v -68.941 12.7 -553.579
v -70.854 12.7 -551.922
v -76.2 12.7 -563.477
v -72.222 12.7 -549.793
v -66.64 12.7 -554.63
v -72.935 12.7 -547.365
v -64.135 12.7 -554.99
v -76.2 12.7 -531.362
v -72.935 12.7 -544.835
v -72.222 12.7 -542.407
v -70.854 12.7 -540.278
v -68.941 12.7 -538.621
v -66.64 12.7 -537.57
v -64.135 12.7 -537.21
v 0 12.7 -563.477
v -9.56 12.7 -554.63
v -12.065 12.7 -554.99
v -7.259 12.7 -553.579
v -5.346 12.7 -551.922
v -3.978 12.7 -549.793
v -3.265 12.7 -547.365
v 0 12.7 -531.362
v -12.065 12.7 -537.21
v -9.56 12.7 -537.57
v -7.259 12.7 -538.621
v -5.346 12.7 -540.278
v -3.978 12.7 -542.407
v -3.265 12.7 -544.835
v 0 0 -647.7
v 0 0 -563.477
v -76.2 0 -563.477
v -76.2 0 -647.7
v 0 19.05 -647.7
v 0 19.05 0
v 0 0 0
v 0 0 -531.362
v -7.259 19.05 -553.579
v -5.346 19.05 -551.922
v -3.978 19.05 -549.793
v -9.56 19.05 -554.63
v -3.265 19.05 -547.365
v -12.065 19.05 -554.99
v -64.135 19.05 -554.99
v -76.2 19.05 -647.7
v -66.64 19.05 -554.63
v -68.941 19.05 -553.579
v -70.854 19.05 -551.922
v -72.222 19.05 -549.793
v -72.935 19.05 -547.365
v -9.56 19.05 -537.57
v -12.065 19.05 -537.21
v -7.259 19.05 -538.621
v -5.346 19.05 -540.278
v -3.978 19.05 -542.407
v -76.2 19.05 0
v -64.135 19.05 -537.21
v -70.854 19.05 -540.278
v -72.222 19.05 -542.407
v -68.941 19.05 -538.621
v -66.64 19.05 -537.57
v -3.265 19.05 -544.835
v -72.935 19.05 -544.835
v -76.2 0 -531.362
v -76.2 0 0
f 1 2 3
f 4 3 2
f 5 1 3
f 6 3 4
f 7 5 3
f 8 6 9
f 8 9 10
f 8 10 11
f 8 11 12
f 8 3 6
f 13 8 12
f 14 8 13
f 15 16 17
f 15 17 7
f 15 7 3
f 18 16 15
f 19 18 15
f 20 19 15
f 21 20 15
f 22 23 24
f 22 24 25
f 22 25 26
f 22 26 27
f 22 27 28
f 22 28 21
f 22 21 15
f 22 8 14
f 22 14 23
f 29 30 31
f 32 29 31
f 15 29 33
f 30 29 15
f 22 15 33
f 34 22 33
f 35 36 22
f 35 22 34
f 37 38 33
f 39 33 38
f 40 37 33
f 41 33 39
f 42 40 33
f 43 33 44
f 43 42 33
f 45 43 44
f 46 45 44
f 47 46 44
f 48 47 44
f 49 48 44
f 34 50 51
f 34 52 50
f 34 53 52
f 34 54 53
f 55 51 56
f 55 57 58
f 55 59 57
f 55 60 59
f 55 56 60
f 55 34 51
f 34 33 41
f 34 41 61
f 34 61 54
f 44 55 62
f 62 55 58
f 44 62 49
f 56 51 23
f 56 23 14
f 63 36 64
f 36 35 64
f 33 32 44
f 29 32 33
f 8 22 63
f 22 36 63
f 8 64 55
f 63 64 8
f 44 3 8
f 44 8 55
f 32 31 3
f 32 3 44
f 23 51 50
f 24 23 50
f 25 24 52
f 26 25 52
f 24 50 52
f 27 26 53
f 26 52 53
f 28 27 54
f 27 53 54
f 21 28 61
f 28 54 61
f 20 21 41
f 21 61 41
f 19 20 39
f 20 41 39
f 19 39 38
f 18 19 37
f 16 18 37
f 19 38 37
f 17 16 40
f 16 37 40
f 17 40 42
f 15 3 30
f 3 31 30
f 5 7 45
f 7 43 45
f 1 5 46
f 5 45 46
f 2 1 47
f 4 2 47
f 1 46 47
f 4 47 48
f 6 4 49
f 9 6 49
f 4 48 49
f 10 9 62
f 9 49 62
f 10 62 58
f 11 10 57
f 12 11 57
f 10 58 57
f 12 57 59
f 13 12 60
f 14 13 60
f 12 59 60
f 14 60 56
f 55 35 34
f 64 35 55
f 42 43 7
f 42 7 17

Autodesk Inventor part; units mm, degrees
ref_plane "YZ Plane" through (0, 0, 0) normal (1, 0, 0) x (0, 1, 0)
ref_plane "XZ Plane" through (0, 0, 0) normal (0, 1, 0) x (-1, 0, 0)
ref_plane "XY Plane" through (0, 0, 0) normal (0, 0, 1) x (1, 0, 0)
sketch "Sketch1" plane through (0, 0, 0) normal (0, 1, 0) x (-1, 0, 0)
  line L0 (0, 0) -> (76.2, 0)
  line L1 (76.2, 0) -> (76.2, -647.7)
  line L2 (76.2, -647.7) -> (0, -647.7)
  line L3 (0, -647.7) -> (0, 0)
  dimension "d1" = 76.2
  dimension "d2" = 647.7
extrude "Extrusion1" add sketch "Sketch1" along normal blind 19.05
sketch "Sketch2" plane through (0, 19.05, 0) normal (0, 1, 0) x (1, 0, 0)
  line L0 (-64.135, 554.99) -> (-12.065, 554.99)
  line L1 (-12.065, 554.99) -> (-12.065, 537.21)
  line L2 (-12.065, 537.21) -> (-64.135, 537.21)
  line L3 (-64.135, 537.21) -> (-64.135, 554.99)
  circle A0 centre (-64.135, 546.1) radius 8.89
  circle A1 centre (-12.065, 546.1) radius 8.89
  line L4 (-73.025, 606.1343) -> (-73.025, 587.8403) construction
  line L5 (-3.175, 554.99) -> (-3.175, 587.8403) construction
  line L6 (0, 647.7) -> (-76.2, 647.7) projected
  line L7 (-38.1, 647.7) -> (-38.1, 0) construction
  line L8 (-76.2, 0) -> (0, 0) projected
  dimension "d5" = 69.85
  dimension "d6" = 34.925
  dimension "d7" = 17.78
  dimension "d8" = 101.6
extrude "Extrusion2" cut sketch "Sketch2" against normal blind 25.4
sketch "Sketch3" plane through (0, 0, 0) normal (0, -1, 0) x (1, 0, 0)
  line L0 (0, 0) -> (0, -647.7) projected
  line L1 (-76.2, -647.7) -> (-76.2, 0) projected
  line L2 (0, -531.3622) -> (-76.2, -531.3622)
  line L3 (-76.2, -531.3622) -> (-76.2, -563.4771)
  line L4 (-76.2, -563.4771) -> (0, -563.4771)
  line L5 (0, -563.4771) -> (0, -531.3622)
  point P0 (0, -563.4771)
extrude "Extrusion3" cut sketch "Sketch3" against normal blind 12.7
equation "\"d1\" = topPlateWidth"
equation "\"d2\" = topPlateLength"
equation "\"d3\" = woodThickness"
equation "\"d6\" = 0.5 * d5"
equation "\"topPlateLength\" = 647.7"
equation "\"woodThickness\" = 19.05"
equation "\"topPlateWidth\" = 76.2"
properties part number "bodyTopPlate"
